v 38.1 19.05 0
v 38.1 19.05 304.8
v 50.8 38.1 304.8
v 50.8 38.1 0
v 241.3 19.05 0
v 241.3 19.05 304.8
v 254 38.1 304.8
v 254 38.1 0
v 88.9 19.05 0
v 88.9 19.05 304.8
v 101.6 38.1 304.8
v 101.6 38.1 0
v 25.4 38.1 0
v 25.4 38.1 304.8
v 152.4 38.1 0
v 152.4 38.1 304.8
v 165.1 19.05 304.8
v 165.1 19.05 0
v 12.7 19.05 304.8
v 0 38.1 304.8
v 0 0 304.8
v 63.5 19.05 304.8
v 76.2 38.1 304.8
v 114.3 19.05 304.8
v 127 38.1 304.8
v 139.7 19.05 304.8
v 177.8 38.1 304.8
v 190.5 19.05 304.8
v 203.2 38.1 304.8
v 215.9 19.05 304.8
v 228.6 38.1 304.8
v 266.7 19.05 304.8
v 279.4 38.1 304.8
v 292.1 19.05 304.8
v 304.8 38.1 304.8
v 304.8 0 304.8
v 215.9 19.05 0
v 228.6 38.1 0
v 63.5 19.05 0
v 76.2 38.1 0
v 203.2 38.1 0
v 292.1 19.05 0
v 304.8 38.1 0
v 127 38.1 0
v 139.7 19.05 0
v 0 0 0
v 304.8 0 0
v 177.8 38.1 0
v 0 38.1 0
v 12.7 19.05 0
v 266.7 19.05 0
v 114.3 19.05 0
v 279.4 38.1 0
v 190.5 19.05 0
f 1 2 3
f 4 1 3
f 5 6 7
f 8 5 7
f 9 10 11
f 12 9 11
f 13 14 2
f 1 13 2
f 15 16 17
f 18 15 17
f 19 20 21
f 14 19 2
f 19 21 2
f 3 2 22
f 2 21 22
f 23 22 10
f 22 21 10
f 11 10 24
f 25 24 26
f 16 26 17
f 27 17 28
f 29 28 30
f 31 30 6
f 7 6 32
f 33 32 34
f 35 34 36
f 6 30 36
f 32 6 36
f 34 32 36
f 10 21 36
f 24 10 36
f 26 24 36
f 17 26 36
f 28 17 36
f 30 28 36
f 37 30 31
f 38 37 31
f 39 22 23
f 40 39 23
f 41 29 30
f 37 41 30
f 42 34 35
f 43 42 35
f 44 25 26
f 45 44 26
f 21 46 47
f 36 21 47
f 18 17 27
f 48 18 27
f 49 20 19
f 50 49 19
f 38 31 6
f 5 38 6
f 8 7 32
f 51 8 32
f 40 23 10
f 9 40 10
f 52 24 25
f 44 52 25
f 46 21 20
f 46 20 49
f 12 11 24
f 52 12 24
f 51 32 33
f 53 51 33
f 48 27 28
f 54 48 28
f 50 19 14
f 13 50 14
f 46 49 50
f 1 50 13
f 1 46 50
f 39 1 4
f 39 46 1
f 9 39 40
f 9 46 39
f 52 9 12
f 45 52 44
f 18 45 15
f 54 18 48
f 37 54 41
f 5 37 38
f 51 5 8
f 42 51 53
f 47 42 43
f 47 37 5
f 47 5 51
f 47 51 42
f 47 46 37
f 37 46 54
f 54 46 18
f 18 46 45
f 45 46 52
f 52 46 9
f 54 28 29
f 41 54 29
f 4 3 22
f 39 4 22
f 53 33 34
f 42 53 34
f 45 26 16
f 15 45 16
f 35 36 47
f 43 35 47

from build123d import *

# Parameters (mm, degrees)
SKETCH1_W           = 304.8
SKETCH1_H           = 304.8
BOSS_EXTRUDE1_DEPTH = 38.1
CUT_EXTRUDE1_DEPTH  = 305.8
LPATTERN1_COUNT     = 12
LPATTERN1_PITCH     = 25.4


with BuildPart() as part:
    # Sketch1 → Boss-Extrude1 (new body)
    with BuildSketch(Plane(origin=(0, 0, 0), x_dir=(1, 0, 0), z_dir=(0, 1, 0))):
        with Locations((152.4, -152.4)):
            Rectangle(SKETCH1_W, SKETCH1_H)
    extrude(amount=BOSS_EXTRUDE1_DEPTH)

    # Sketch2 → Cut-Extrude1 (cut, through all)
    with BuildSketch(Plane.XY.offset(304.8)):
        Polygon((0, 38.1), (12.7, 19.05), (25.4, 38.1), align=None)
    cut_extrude1 = extrude(amount=-CUT_EXTRUDE1_DEPTH, mode=Mode.SUBTRACT)

    # LPattern1: Cut-Extrude1 ×12
    with Locations(*[(i * LPATTERN1_PITCH, 0, 0) for i in range(1, LPATTERN1_COUNT)]):
        add(cut_extrude1, mode=Mode.SUBTRACT)


solid = part.part
